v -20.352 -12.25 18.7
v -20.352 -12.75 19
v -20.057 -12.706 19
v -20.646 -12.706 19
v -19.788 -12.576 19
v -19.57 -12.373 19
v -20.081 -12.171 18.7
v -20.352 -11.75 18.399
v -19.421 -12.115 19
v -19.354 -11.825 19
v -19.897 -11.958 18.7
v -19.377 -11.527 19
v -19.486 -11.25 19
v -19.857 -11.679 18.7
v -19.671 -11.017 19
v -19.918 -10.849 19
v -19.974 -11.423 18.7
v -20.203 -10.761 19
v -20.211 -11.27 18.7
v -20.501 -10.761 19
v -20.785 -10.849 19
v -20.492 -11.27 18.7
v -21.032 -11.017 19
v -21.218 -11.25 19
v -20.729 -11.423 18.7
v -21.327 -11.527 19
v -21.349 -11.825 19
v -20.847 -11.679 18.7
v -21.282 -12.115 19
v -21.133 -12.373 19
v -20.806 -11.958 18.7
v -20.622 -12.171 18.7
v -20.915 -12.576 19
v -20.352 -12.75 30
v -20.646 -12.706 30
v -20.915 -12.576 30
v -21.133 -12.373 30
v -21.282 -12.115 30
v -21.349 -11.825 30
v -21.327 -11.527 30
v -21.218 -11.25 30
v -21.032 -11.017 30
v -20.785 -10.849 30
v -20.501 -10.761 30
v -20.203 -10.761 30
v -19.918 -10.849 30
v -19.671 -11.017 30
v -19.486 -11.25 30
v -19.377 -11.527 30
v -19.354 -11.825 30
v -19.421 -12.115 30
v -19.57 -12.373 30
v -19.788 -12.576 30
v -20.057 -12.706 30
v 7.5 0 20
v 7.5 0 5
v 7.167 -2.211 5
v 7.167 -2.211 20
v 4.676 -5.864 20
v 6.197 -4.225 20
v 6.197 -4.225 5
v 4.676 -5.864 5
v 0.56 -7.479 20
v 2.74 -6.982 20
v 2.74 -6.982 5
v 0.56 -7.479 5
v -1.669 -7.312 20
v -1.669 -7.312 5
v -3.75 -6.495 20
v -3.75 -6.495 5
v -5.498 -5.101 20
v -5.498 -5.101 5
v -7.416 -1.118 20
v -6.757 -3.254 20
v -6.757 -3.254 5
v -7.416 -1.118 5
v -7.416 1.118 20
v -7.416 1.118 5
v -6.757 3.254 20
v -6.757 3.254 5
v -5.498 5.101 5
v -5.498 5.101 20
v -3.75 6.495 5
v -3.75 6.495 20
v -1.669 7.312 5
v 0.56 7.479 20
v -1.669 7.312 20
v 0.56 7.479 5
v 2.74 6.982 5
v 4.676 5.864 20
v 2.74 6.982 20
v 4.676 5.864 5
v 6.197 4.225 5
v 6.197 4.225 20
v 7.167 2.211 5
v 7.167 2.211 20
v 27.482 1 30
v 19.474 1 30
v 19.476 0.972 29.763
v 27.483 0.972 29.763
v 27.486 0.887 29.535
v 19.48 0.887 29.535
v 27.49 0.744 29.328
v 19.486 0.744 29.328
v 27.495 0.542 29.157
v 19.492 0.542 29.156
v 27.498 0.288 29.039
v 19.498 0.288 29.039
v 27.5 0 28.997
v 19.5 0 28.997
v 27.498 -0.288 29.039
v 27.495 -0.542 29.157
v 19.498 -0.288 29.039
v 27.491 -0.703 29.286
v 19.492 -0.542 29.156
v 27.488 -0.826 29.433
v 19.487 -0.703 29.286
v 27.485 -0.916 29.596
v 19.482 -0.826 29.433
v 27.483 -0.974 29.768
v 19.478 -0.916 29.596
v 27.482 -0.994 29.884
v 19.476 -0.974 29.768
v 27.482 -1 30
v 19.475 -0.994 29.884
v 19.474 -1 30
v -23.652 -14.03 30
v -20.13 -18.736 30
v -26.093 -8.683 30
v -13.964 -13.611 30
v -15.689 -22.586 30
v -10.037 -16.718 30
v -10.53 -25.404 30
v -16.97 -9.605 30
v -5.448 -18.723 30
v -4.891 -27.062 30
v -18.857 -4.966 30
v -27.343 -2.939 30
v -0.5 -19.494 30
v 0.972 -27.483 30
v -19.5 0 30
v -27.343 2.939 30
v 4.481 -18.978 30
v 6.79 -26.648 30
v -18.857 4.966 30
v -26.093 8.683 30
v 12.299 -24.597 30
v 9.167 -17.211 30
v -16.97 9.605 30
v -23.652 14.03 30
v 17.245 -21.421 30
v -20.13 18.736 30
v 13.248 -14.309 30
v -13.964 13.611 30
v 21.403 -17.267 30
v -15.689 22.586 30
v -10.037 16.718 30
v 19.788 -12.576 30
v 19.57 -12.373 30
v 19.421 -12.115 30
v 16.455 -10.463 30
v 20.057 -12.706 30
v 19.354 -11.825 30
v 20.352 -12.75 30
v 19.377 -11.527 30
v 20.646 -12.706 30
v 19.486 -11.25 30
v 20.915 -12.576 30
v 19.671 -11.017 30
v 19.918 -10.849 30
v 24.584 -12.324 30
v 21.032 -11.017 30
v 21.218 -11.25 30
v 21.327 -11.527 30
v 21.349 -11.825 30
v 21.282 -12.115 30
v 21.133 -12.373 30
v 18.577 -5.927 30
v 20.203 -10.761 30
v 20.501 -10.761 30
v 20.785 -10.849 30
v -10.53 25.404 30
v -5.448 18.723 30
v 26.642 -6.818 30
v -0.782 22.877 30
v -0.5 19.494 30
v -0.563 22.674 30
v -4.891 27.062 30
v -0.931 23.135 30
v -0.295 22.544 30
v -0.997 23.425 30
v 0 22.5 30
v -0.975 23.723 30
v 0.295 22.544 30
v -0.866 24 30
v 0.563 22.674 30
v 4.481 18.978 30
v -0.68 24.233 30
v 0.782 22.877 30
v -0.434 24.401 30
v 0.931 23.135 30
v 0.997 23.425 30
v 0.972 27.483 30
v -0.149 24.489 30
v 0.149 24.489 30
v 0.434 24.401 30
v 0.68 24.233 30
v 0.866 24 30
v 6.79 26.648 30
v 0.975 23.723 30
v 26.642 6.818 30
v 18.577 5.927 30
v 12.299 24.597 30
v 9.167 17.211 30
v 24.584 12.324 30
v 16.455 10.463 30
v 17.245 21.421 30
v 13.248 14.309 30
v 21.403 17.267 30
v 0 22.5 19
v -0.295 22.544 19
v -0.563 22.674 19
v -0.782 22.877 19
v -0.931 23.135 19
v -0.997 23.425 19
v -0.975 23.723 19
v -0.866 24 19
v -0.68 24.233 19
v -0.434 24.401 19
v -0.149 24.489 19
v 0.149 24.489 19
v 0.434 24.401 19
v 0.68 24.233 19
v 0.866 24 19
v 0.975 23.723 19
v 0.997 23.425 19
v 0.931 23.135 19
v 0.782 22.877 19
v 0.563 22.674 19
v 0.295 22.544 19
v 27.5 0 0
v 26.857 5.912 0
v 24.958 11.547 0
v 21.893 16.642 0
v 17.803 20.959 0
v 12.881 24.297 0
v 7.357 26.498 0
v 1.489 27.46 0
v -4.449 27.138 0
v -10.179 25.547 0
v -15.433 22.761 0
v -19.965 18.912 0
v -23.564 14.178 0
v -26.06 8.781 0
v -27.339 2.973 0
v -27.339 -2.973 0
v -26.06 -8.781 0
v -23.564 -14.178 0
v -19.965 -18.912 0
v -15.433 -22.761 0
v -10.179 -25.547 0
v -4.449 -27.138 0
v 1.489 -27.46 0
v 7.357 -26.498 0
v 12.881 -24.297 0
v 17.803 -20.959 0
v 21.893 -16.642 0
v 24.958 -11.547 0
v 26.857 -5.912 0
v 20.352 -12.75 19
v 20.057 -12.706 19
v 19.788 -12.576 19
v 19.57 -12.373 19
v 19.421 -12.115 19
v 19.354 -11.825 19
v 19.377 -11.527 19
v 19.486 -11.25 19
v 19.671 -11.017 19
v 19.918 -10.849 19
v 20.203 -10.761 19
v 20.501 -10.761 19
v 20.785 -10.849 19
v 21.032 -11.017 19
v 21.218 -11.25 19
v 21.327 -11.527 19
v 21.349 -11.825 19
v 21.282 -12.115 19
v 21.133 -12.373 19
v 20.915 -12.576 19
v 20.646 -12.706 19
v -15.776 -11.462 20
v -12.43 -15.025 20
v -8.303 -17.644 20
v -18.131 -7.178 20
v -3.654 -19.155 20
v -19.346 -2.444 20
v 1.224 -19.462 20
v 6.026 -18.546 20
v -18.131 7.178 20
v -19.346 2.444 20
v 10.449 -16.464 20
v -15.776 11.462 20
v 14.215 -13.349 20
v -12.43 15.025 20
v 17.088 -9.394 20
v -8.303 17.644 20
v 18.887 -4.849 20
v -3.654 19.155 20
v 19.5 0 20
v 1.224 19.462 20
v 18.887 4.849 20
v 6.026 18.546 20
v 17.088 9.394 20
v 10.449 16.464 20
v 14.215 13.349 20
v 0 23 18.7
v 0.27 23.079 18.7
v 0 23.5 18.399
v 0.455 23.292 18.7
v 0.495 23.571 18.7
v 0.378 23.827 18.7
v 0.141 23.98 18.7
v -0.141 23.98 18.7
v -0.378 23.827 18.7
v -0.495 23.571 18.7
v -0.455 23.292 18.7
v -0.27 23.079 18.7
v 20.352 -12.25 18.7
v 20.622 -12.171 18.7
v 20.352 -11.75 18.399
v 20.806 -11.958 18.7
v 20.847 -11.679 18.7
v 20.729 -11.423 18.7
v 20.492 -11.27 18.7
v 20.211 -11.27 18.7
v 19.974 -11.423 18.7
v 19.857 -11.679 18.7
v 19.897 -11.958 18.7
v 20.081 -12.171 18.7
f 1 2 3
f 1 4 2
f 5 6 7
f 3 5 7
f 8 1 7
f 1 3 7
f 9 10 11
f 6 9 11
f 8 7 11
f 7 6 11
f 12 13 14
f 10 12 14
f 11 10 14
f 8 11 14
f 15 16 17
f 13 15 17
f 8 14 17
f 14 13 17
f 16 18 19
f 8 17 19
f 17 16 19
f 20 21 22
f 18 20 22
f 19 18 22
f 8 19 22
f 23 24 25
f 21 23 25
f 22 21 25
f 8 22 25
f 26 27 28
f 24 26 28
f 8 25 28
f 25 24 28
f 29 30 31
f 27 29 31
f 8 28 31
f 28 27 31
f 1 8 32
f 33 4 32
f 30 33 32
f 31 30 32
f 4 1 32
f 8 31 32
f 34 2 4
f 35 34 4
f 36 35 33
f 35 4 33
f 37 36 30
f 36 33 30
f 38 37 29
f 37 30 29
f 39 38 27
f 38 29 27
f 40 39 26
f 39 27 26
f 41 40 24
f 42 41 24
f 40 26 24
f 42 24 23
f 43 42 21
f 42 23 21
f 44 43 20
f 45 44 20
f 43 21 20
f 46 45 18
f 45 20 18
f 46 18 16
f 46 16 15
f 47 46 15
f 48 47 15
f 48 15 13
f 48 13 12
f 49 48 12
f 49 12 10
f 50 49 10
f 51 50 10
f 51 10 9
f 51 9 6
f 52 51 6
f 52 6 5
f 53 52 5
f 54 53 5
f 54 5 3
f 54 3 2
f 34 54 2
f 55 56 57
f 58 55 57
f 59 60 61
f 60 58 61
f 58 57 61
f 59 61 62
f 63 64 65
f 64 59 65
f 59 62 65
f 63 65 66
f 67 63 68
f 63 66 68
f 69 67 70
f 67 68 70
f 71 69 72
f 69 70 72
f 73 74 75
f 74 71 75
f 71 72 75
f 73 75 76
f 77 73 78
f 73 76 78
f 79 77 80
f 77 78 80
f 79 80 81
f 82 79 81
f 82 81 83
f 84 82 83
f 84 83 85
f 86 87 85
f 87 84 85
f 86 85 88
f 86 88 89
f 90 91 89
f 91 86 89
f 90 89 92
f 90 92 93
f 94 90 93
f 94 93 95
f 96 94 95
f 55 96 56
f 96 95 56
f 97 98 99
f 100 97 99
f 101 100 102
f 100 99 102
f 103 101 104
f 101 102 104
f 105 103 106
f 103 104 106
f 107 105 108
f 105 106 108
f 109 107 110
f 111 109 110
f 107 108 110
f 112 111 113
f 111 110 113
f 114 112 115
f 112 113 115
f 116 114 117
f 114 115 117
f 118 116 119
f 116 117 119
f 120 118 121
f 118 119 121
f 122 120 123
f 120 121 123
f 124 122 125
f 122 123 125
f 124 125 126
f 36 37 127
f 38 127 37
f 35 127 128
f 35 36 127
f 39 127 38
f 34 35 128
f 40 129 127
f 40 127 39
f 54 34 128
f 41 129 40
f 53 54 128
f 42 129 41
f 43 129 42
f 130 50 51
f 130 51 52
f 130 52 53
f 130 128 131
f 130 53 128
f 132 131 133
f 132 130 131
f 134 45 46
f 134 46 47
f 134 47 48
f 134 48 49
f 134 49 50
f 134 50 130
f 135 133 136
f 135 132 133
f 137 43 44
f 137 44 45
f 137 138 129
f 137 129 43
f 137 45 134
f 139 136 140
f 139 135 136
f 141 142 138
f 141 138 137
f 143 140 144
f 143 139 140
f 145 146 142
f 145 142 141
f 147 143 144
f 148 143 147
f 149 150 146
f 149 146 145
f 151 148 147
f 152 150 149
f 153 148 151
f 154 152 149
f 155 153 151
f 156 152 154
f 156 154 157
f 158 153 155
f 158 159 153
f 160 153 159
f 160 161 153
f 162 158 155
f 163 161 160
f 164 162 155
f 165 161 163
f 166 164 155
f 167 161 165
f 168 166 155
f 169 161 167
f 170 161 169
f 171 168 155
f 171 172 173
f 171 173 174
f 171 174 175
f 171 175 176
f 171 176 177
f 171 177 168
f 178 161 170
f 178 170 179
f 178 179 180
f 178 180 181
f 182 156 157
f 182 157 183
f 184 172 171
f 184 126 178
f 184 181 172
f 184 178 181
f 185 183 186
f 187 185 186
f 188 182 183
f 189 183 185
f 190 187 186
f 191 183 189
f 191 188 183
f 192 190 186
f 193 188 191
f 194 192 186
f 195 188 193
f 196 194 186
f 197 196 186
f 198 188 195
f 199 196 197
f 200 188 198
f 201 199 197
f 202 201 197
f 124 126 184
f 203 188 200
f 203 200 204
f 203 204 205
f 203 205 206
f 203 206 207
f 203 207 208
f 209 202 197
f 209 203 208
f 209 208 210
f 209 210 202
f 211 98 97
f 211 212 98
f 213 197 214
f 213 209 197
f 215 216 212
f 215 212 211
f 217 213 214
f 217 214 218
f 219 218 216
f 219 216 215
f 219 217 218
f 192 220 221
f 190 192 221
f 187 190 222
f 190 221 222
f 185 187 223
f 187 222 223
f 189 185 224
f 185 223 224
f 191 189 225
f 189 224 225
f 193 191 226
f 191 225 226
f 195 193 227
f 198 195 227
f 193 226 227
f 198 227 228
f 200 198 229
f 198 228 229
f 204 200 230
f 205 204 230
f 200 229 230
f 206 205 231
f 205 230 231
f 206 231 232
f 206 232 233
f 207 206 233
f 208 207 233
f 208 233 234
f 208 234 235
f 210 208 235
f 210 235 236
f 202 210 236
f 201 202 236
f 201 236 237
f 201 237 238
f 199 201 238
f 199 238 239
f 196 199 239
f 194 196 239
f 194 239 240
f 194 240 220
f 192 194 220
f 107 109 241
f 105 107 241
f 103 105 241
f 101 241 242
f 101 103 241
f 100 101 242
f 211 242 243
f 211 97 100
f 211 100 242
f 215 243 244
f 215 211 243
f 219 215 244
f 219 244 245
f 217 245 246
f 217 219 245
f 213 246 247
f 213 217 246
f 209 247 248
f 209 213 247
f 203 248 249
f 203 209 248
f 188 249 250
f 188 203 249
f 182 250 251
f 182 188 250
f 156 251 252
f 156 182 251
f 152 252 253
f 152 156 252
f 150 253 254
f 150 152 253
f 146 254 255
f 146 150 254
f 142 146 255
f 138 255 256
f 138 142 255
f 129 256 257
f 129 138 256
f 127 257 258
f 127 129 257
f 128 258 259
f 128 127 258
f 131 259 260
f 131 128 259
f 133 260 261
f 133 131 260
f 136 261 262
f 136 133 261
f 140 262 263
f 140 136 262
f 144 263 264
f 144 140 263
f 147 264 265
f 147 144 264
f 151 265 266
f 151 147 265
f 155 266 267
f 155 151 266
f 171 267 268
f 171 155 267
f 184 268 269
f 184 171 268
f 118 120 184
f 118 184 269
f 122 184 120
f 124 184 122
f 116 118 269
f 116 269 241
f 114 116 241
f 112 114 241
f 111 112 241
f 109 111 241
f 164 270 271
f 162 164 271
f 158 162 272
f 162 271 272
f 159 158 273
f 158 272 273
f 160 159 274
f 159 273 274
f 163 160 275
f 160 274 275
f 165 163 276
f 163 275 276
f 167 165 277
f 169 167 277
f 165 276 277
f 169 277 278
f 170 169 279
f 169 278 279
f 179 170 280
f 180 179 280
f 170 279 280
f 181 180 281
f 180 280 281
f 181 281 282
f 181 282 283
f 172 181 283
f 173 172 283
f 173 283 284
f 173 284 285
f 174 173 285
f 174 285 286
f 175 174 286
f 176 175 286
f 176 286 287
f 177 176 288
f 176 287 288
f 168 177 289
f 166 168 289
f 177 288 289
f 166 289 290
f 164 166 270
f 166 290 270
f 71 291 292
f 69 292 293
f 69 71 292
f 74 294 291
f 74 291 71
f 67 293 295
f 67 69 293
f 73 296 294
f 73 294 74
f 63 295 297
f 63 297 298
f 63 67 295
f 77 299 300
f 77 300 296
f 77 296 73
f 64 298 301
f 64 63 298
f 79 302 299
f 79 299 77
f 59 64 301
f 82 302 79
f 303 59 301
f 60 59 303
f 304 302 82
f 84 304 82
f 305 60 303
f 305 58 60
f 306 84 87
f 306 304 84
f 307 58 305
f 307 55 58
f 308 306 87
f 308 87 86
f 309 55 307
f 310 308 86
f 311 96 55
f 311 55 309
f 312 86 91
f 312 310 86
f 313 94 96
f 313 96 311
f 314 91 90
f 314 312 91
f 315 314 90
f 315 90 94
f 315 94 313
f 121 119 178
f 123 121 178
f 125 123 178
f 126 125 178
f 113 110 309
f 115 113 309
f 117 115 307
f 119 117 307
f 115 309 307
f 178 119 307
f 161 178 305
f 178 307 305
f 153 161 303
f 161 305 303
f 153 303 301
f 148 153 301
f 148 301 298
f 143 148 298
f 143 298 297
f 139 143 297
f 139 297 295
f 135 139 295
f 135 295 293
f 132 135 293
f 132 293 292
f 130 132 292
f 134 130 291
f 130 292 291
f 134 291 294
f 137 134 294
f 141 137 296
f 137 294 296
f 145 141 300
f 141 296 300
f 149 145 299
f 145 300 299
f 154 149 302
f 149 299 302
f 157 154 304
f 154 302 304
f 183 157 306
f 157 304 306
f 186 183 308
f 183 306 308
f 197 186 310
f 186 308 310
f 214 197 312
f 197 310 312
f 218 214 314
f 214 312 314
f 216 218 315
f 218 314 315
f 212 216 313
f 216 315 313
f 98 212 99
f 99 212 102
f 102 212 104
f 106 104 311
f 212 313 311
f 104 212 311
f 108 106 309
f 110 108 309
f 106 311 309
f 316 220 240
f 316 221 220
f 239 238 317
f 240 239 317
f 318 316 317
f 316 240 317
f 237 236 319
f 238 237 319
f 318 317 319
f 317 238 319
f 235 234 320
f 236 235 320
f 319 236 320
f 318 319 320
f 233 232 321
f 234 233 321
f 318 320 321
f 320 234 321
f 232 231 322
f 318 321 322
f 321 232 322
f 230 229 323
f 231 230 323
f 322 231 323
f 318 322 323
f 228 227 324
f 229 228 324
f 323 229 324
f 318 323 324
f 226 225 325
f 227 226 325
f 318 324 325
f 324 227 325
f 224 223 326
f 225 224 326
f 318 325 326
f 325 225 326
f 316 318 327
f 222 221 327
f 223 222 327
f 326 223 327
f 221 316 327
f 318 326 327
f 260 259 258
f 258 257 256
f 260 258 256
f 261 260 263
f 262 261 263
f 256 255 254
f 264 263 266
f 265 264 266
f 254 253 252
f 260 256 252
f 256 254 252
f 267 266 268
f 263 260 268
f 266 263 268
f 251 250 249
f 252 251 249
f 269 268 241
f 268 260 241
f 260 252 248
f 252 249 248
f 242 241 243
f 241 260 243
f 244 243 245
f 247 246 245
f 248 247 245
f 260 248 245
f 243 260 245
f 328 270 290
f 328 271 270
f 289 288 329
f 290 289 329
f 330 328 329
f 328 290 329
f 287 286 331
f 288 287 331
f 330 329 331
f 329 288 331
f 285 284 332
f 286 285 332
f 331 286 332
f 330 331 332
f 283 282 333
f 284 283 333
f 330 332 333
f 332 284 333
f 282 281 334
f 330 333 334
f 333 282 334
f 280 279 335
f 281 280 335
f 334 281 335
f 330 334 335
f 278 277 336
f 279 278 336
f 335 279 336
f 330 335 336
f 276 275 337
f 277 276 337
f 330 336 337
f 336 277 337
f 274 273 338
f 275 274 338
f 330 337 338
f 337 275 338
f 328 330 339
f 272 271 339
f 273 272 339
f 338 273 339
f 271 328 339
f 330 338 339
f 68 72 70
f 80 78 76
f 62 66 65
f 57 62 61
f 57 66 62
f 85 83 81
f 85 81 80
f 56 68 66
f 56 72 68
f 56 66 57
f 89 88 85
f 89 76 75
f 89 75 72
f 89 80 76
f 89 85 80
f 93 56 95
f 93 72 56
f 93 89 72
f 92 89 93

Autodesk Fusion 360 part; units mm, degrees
sketch "Sketch1" plane through (0, 0, 0) normal (0, 1, 0) x (1, 0, 0)
  line L0 (0, 0) -> (27.5, 0)
  line L1 (27.5, 0) -> (27.5, -30)
  line L2 (27.5, -30) -> (19.5, -30)
  line L3 (19.5, -30) -> (19.5, -20)
  line L4 (19.5, -20) -> (7.5, -20)
  line L5 (7.5, -20) -> (7.5, -5)
  line L6 (7.5, -5) -> (0, -5)
  line L7 (0, -5) -> (0, 0)
  line L8 (19, -30) -> (19, -28)
  line L9 (19, -28) -> (7, -28)
  line L10 (7, -28) -> (7, -12)
  line L11 (7, -12) -> (0, -12)
  line L12 (0, -12) -> (0, -30)
  line L13 (0, -30) -> (19, -30)
  line L14 (27.5, -30) -> (18.2223, -30)
  line L15 (27.5, -35) -> (27.5, -30)
  line L16 (15.5, -35) -> (15.5, -32)
  line L17 (11, -30) -> (27.5, -30)
  line L18 (15.5, -35) -> (27.5, -35)
  line L19 (19.5, -30) -> (19.5, -32)
  line L20 (19.5, -32) -> (15.5, -32)
  dimension "d1" = 7.5
  dimension "d2" = 27.5
  dimension "d3" = 30
  dimension "d4" = 8
  dimension "d5" = 10
  dimension "d6" = 5
  dimension "d8" = 19
  dimension "d9" = 2
  dimension "d10" = 18
  dimension "d11" = 7
  dimension "d13" = 12
  dimension "d15" = 3
  dimension "d16" = 2
  dimension "d21" = 11
revolve "Revolve1" add sketch "Sketch1" angle 360 about axis through (0, 0, 1.75) along (0, 0, 1) contours L0 L1 L2 L3 L4 L5 L6 L7 L14 L17 makes body 1
revolve "Revolve2" add sketch "Sketch1" angle 360 about axis through (0, 0, 5) along (0, 0, -1) separate body contours L2 L14 L15 L16 L17 L18 L19 L20 makes body 2
revolve "Revolve3" add sketch "Sketch1" angle 360 about axis through (0, 0, 12) along (0, 0, 1) separate body contours L8 L9 L10 L11 L12 L13 L14 L17 makes body 3
chamfer "Chamfer1" distance 2 angle 45 1 edges at (-6.5263, -2.5313, 12) on bodies 3
chamfer "Chamfer2" distance 1 angle 45 1 edges at (-25.639, -9.9444, 35) on bodies 2
sketch "Sketch2" plane through (0, 0, 35) normal (0, 0, 1) x (-1, 0, 0)
  circle A0 centre (0, 0) radius 15.5
  circle A1 centre (0, 0) radius 26.5
  circle A2 centre (0, 0) radius 23.5 construction
  circle A3 centre (0, 0) radius 27.5
  line L0 (0, 0) -> (-19, 0)
  line L1 (0, 0) -> (0, -32) construction
  circle A4 centre (0, -23.5) radius 1
  circle A5 centre (20.3516, 11.75) radius 1
  circle A6 centre (-20.3516, 11.75) radius 1
  dimension "d22" = 2
  dimension "d24" = 360
  dimension "d30" = 50
  dimension "d31" = 32
  dimension "d32" = 47
hole "Hole1" at (-20.3516, -11.75, 35) at (0, 23.5, 35) at (20.3516, -11.75, 35) direction (0, 0, -1) diameter 2 depth 16 tip angle 118 countersink diameter 6 countersink angle 90 bodies 1 2 3
hole "Hole2" at (27.5, 0, 29.9966) direction (-1, 0, 0) diameter 2 depth 10 tip angle 118 bodies 1 2
component "Body" placed x (1, 0, 0) y (0, 1, 0) z (0, 0, 1) at (0, 0, 0)
component "Retaininer" placed x (1, 0, 0) y (0, 1, 0) z (0, 0, 1) at (0, 0, 0)
component "Plunger" placed x (1, 0, 0) y (0, 1, 0) z (0, 0, 1) at (0, 0, 0)
hidden bodies 2 3
equation "d1 = ( 15 / 2 ) * 1 mm"
equation "d2 = ( 55 / 2 ) * 1 mm"
equation "d8 = d2 - d4 - 0.5 mm"
equation "d10 = d3 - d5 - 2 mm"
equation "d11 = d1 - 0.5 mm"
equation "d13 = d4 + 4 mm"
equation "d32 = 55 mm - 8 mm"
